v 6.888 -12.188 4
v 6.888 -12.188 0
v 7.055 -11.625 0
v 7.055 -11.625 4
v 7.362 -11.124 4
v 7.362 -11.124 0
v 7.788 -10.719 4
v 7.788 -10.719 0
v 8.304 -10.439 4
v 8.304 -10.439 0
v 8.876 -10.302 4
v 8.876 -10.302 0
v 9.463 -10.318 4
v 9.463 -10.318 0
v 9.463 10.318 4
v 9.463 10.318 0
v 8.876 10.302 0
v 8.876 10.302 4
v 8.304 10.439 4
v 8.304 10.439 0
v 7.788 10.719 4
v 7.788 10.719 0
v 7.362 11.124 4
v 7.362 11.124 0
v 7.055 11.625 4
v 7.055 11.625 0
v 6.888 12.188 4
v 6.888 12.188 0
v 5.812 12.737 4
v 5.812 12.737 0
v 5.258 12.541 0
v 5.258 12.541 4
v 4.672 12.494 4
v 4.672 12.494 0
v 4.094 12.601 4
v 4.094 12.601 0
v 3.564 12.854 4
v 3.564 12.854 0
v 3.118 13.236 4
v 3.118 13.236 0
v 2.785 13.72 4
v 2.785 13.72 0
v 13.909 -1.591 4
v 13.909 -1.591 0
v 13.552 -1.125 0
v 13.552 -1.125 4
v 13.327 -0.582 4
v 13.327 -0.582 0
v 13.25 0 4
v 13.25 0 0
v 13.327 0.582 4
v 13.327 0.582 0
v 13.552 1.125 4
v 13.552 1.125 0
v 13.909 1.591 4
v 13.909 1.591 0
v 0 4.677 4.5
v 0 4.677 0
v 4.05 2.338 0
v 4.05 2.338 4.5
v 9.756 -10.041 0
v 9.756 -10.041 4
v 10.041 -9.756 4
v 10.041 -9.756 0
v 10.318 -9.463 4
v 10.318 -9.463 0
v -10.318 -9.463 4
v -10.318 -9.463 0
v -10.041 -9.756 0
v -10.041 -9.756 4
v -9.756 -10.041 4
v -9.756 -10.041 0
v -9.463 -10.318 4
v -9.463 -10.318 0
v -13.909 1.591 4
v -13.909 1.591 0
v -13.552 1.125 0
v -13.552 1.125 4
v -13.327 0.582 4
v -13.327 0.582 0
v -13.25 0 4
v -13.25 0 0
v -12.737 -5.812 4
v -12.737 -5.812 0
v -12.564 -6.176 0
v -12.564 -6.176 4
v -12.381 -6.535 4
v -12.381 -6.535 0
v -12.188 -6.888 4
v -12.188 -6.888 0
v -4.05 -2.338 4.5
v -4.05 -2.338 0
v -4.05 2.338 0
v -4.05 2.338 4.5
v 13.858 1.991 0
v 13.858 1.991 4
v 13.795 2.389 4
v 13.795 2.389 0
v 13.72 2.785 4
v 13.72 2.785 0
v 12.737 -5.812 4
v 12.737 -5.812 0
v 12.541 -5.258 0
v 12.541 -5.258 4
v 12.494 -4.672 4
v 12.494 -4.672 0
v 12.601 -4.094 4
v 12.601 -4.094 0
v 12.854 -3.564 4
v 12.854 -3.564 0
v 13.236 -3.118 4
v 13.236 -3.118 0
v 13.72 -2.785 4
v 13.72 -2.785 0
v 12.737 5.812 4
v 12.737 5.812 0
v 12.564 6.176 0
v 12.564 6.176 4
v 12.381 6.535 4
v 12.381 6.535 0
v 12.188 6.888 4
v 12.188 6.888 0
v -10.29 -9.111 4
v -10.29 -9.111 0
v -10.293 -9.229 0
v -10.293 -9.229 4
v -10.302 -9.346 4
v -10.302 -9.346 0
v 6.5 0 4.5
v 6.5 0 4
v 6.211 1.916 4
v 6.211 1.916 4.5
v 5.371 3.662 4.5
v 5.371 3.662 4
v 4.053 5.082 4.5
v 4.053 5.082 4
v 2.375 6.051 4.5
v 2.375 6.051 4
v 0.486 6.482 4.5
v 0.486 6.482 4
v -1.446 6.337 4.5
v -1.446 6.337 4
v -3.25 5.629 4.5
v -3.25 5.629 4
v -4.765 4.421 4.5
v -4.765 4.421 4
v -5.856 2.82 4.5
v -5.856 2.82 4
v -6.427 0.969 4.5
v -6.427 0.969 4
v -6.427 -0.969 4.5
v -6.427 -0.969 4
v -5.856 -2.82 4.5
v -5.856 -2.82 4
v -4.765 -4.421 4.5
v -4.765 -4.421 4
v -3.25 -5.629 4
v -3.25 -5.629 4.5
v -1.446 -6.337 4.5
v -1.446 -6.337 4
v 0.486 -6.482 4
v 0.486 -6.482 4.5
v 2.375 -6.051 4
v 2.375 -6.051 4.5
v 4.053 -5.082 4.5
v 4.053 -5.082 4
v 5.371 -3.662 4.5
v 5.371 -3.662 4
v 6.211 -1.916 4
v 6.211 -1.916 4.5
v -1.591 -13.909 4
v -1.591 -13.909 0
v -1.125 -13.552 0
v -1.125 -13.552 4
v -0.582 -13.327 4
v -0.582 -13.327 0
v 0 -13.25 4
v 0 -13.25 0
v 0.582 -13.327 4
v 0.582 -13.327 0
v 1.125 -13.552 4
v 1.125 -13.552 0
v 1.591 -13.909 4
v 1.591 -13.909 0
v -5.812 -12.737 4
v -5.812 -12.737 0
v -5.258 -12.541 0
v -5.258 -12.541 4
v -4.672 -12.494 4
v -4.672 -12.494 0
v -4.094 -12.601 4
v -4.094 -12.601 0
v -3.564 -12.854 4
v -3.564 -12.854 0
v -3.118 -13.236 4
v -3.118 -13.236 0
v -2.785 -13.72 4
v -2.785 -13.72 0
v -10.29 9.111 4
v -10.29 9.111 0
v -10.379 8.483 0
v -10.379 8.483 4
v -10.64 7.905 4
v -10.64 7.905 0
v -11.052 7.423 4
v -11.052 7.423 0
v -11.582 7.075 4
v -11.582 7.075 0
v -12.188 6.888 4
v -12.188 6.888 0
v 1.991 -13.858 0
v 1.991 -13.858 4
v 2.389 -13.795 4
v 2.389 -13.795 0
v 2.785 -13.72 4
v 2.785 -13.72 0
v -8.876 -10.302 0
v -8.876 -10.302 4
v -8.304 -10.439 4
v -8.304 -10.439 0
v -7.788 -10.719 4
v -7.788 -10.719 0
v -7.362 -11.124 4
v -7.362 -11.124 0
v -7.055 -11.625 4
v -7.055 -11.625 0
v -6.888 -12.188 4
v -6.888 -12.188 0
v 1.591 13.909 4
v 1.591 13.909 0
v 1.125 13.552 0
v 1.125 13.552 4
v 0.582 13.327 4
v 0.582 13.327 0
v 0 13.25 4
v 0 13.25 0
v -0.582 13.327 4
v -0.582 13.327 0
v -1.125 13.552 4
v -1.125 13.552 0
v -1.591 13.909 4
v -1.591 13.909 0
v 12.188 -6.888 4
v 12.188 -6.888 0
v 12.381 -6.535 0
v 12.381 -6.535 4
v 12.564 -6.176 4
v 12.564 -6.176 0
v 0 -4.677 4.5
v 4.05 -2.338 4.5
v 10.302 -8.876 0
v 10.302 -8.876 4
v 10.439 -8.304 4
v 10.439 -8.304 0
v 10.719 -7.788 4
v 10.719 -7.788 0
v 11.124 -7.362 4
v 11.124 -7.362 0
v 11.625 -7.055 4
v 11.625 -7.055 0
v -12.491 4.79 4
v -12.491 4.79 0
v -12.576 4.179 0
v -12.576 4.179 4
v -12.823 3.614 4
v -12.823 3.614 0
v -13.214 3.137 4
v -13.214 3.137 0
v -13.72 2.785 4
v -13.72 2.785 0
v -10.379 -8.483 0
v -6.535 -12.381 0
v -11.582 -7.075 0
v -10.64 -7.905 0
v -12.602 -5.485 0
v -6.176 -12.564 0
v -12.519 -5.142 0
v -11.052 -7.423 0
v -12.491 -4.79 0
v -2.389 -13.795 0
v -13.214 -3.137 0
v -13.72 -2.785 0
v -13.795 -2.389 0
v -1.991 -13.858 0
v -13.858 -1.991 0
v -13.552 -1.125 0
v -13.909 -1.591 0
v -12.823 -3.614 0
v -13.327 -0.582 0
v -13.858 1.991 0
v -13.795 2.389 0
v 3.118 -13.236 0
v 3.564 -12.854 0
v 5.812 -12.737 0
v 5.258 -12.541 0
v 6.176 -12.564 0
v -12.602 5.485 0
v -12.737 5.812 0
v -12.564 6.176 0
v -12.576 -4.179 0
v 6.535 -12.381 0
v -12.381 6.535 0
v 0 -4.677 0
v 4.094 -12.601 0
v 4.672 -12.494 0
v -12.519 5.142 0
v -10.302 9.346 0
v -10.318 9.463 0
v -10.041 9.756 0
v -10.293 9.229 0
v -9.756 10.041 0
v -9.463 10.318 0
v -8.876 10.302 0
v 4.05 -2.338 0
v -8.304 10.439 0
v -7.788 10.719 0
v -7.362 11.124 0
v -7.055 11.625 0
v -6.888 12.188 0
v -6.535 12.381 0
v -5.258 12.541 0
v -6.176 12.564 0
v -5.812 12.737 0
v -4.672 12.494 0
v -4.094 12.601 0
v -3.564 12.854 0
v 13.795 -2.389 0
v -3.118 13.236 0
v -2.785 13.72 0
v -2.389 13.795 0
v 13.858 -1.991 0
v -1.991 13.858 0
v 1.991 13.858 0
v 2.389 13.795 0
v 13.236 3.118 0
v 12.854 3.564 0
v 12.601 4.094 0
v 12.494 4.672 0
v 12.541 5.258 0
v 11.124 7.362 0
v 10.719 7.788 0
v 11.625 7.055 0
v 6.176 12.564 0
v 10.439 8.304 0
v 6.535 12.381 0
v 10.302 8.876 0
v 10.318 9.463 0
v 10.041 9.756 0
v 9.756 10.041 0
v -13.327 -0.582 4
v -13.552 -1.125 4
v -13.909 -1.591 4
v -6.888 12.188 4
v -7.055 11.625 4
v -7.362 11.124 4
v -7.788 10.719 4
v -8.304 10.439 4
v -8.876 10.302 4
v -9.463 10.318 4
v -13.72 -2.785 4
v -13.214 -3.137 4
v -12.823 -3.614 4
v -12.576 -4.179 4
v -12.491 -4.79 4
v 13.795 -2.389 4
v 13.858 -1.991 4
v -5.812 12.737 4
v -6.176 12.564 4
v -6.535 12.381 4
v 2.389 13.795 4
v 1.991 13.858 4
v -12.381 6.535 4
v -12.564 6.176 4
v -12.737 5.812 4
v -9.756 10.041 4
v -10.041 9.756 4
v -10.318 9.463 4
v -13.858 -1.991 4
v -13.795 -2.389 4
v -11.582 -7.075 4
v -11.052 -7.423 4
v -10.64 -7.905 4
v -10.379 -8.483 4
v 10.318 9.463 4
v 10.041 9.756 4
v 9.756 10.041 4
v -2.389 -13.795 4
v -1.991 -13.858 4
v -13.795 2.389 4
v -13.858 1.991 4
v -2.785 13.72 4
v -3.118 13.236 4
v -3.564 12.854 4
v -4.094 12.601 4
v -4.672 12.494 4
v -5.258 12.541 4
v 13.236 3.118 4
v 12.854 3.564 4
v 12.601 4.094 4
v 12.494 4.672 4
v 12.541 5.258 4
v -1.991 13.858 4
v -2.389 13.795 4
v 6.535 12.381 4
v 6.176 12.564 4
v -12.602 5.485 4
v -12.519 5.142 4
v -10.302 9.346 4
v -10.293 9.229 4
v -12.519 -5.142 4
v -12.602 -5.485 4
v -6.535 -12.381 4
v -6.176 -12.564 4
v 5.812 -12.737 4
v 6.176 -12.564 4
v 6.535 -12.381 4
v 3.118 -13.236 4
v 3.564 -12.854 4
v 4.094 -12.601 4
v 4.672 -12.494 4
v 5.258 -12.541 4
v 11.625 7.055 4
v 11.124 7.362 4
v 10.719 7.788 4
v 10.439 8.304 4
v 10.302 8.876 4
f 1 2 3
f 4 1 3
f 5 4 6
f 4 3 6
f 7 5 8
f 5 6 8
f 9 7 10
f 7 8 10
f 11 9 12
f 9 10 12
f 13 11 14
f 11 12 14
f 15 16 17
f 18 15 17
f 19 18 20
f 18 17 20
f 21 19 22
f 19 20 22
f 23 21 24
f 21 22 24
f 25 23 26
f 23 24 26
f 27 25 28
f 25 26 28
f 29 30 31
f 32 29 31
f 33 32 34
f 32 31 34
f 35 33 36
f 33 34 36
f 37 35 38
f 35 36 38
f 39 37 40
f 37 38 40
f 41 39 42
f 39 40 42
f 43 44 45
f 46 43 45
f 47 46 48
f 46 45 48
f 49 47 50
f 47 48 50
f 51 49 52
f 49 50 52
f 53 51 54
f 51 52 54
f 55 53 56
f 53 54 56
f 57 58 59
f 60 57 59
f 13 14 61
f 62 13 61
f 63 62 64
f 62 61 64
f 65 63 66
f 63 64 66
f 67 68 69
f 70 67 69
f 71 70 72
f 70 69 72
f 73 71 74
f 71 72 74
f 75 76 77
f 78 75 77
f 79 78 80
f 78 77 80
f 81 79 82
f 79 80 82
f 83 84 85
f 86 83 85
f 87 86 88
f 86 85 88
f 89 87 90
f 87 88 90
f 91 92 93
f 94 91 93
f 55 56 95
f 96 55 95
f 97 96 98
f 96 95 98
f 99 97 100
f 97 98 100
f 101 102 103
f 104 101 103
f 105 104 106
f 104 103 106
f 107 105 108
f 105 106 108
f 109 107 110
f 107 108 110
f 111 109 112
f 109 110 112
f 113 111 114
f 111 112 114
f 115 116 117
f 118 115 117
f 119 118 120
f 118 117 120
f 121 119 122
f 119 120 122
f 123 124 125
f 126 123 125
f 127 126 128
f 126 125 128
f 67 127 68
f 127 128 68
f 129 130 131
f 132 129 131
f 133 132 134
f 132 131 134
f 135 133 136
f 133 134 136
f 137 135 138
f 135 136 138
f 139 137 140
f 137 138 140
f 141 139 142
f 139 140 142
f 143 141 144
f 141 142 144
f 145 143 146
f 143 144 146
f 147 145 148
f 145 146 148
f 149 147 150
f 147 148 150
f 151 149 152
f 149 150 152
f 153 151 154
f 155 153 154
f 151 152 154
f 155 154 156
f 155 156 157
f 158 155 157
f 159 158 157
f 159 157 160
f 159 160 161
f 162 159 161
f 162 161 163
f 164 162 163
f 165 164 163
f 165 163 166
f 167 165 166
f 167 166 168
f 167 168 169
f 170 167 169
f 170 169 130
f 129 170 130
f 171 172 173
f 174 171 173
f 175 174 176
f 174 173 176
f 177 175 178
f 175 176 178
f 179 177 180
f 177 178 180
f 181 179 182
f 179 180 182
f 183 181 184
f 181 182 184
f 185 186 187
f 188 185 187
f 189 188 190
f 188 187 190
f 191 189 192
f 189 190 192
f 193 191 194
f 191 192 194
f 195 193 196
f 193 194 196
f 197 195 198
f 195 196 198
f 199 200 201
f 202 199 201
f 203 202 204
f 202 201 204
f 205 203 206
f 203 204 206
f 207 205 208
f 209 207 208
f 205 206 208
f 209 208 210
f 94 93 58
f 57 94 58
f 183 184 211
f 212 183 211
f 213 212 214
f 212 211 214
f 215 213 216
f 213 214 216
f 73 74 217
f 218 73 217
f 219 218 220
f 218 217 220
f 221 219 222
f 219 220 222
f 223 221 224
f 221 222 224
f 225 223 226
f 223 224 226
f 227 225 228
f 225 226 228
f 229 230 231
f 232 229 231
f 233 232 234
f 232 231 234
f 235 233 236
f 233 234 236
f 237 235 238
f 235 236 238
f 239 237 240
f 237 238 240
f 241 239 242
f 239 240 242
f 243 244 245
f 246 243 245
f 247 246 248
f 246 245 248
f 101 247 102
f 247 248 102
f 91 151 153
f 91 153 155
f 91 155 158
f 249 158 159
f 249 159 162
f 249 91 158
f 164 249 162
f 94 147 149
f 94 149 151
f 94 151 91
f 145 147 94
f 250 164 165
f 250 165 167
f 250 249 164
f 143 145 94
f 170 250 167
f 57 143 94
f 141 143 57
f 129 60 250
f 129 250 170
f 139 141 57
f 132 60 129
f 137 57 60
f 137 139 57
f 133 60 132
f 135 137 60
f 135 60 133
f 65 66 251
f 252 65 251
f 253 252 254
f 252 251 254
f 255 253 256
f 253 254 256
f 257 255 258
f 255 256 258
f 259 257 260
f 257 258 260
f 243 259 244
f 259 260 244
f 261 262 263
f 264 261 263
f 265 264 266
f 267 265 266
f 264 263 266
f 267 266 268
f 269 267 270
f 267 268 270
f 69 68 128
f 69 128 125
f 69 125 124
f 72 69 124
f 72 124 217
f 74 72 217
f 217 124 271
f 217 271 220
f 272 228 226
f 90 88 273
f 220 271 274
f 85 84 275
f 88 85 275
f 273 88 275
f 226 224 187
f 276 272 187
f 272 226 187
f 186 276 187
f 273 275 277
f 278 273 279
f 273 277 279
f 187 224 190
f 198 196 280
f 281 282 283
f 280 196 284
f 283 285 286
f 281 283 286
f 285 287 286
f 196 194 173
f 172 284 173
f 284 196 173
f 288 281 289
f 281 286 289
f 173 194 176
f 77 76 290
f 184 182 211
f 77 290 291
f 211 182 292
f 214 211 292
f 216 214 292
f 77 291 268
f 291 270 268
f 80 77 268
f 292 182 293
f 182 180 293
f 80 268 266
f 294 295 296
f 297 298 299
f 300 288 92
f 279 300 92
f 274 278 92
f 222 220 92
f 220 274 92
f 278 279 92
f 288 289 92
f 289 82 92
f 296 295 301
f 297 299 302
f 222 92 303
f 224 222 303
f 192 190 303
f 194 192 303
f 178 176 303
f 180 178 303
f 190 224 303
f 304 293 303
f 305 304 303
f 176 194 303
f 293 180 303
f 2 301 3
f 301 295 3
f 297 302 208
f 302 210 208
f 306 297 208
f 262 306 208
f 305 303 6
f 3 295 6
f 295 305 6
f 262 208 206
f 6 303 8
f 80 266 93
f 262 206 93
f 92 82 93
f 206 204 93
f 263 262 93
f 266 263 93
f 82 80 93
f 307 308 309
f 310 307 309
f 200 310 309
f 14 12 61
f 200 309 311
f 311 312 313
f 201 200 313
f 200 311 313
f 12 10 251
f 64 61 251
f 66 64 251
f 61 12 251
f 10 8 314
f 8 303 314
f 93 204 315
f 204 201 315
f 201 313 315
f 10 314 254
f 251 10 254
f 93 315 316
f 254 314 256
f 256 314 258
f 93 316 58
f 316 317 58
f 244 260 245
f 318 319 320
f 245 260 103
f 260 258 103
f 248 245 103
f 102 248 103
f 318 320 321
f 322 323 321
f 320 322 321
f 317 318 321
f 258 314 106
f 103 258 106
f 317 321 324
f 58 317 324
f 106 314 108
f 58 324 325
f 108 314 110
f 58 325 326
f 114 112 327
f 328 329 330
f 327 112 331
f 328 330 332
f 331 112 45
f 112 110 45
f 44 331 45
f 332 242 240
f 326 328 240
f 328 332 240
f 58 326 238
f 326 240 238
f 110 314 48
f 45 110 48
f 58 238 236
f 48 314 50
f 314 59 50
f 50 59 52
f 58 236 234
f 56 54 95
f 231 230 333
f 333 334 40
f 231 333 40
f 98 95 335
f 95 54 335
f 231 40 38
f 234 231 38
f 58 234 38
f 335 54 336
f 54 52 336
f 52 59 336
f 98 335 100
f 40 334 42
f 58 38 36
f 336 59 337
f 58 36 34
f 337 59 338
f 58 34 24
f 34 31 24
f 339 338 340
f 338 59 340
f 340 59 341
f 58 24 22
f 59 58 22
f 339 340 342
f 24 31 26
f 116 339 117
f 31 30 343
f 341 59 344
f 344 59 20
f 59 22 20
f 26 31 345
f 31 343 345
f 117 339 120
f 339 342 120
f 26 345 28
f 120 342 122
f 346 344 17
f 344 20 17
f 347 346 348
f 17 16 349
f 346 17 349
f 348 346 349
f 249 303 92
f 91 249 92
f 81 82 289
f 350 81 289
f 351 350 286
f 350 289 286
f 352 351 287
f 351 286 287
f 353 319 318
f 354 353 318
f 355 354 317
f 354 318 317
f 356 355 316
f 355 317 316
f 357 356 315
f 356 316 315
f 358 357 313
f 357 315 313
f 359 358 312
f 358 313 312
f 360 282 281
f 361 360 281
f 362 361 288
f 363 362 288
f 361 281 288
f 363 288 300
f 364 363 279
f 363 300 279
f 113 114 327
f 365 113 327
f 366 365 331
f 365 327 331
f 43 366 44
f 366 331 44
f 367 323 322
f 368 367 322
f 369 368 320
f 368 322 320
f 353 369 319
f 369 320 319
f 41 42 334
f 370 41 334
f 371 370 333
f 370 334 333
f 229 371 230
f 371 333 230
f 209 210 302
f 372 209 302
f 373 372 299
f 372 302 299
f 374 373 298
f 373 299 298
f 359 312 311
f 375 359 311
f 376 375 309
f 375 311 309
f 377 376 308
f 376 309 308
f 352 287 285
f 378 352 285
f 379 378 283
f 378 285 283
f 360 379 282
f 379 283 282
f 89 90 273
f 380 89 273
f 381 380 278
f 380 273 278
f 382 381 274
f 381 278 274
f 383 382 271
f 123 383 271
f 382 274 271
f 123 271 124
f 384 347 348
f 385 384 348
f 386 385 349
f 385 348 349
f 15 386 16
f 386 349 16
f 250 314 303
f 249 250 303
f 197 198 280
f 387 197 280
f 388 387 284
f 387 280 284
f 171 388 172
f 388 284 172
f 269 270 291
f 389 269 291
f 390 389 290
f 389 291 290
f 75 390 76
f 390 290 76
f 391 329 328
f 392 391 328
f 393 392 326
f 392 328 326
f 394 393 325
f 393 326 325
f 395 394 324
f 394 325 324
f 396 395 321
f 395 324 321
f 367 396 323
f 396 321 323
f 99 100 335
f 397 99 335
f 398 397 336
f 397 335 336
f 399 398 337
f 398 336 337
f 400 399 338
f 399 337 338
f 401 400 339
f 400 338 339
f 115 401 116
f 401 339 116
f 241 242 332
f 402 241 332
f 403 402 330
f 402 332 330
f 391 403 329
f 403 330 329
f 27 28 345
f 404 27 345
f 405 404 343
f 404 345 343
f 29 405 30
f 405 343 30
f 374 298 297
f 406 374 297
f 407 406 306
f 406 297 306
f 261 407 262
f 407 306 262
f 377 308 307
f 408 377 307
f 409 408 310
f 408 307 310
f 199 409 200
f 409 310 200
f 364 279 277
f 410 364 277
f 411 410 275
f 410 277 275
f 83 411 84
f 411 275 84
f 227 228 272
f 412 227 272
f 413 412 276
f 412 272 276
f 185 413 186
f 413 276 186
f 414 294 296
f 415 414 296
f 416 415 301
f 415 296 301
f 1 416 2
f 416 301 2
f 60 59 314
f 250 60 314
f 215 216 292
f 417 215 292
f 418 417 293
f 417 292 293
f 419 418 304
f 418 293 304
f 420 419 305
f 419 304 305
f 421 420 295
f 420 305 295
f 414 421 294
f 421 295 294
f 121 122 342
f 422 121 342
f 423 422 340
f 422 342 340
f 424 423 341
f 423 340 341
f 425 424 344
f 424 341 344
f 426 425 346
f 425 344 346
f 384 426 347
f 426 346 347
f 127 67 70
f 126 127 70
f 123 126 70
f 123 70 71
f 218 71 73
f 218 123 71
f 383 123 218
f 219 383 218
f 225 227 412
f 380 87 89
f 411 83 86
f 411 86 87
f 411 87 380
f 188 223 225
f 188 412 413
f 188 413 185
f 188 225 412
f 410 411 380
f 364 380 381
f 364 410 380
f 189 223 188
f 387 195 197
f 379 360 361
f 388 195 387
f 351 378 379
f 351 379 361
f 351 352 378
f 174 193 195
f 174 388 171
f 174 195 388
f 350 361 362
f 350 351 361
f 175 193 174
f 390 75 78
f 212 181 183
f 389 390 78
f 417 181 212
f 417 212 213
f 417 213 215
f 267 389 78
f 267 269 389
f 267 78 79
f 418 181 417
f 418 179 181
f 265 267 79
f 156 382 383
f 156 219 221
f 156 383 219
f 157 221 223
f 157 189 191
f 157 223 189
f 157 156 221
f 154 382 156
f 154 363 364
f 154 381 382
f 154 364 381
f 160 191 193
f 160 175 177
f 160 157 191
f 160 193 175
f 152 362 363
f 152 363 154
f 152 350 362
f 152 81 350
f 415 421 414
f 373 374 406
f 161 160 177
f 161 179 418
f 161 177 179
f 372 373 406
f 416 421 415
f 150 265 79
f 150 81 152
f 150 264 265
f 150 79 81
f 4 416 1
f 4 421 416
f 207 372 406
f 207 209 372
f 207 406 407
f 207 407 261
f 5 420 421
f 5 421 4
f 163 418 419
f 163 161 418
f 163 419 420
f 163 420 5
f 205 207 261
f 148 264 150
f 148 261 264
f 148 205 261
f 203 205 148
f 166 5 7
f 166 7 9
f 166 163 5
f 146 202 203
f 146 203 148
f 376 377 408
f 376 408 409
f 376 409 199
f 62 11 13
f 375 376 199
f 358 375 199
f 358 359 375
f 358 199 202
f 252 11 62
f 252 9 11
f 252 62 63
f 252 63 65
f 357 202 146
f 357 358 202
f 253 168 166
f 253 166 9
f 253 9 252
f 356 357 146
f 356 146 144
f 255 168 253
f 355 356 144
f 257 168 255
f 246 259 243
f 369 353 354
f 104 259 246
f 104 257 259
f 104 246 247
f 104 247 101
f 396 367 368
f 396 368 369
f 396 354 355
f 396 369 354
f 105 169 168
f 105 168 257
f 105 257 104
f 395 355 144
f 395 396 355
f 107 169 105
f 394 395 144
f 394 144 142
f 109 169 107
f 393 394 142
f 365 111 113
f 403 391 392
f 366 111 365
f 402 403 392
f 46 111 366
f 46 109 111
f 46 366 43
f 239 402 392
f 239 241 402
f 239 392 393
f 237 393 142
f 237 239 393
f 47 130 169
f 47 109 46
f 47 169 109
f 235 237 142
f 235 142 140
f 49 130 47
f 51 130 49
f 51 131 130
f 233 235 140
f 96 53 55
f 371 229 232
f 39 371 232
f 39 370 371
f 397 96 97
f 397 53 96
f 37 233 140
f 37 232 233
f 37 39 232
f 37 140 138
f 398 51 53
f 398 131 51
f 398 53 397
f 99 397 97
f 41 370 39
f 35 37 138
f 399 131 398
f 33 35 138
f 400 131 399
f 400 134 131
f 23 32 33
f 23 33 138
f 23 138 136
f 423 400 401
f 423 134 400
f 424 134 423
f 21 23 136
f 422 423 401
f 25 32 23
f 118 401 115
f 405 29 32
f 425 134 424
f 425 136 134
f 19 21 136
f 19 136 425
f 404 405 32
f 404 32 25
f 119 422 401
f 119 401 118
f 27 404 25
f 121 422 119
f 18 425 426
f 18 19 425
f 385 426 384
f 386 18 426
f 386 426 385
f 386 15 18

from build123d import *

# Parameters (mm, degrees)
F0_R     = 6.5
F1_DEPTH = 4
F2_DEPTH = 4.5


with BuildPart() as f1:
    # F0 (on Top) → F1 (new body)
    with BuildSketch(Plane.XY):
        with BuildLine():
            ThreePointArc((13.909274, -1.591255), (13.25, 0), (13.909274, 1.591255))
            ThreePointArc((13.909274, 1.591255), (13.827637, 2.190083), (13.720231, 2.784829))
            ThreePointArc((13.720231, 2.784829), (12.601499, 4.094475), (12.736781, 5.811575))
            ThreePointArc((12.736781, 5.811575), (12.474091, 6.355867), (12.188155, 6.888314))
            ThreePointArc((12.188155, 6.888314), (10.719475, 7.788155), (10.317523, 9.463018))
            ThreePointArc((10.317523, 9.463018), (9.899495, 9.899495), (9.463018, 10.317523))
            ThreePointArc((9.463018, 10.317523), (7.788155, 10.719475), (6.888314, 12.188155))
            ThreePointArc((6.888314, 12.188155), (6.355867, 12.474091), (5.811575, 12.736781))
            ThreePointArc((5.811575, 12.736781), (4.094475, 12.601499), (2.784829, 13.720231))
            ThreePointArc((2.784829, 13.720231), (2.190083, 13.827637), (1.591255, 13.909274))
            ThreePointArc((1.591255, 13.909274), (0, 13.25), (-1.591255, 13.909274))
            ThreePointArc((-1.591255, 13.909274), (-2.190083, 13.827637), (-2.784829, 13.720231))
            ThreePointArc((-2.784829, 13.720231), (-4.094475, 12.601499), (-5.811575, 12.736781))
            ThreePointArc((-5.811575, 12.736781), (-6.355867, 12.474091), (-6.888314, 12.188155))
            ThreePointArc((-6.888314, 12.188155), (-7.788155, 10.719475), (-9.463018, 10.317523))
            ThreePointArc((-9.463018, 10.317523), (-9.899495, 9.899495), (-10.317523, 9.463018))
            ThreePointArc((-10.317523, 9.463018), (-10.296714, 9.287391), (-10.289763, 9.110671))
            ThreePointArc((-10.289763, 9.110671), (-10.828971, 7.649271), (-12.188155, 6.888314))
            ThreePointArc((-12.188155, 6.888314), (-12.474091, 6.355867), (-12.736781, 5.811575))
            ThreePointArc((-12.736781, 5.811575), (-12.553587, 5.315197), (-12.491376, 4.789763))
            ThreePointArc((-12.491376, 4.789763), (-12.823033, 3.613982), (-13.720231, 2.784829))
            ThreePointArc((-13.720231, 2.784829), (-13.827637, 2.190083), (-13.909274, 1.591255))
            ThreePointArc((-13.909274, 1.591255), (-13.421343, 0.86121), (-13.25, 0))
            ThreePointArc((-13.25, 0), (-13.421343, -0.86121), (-13.909274, -1.591255))
            ThreePointArc((-13.909274, -1.591255), (-13.827637, -2.190083), (-13.720231, -2.784829))
            ThreePointArc((-13.720231, -2.784829), (-12.823033, -3.613982), (-12.491376, -4.789763))
            ThreePointArc((-12.491376, -4.789763), (-12.553587, -5.315197), (-12.736781, -5.811575))
            ThreePointArc((-12.736781, -5.811575), (-12.474091, -6.355867), (-12.188155, -6.888314))
            ThreePointArc((-12.188155, -6.888314), (-10.828971, -7.649271), (-10.289763, -9.110671))
            ThreePointArc((-10.289763, -9.110671), (-10.296714, -9.287391), (-10.317523, -9.463018))
            ThreePointArc((-10.317523, -9.463018), (-9.899495, -9.899495), (-9.463018, -10.317523))
            ThreePointArc((-9.463018, -10.317523), (-7.788155, -10.719475), (-6.888314, -12.188155))
            ThreePointArc((-6.888314, -12.188155), (-6.355867, -12.474091), (-5.811575, -12.736781))
            ThreePointArc((-5.811575, -12.736781), (-4.094475, -12.601499), (-2.784829, -13.720231))
            ThreePointArc((-2.784829, -13.720231), (-2.190083, -13.827637), (-1.591255, -13.909274))
            ThreePointArc((-1.591255, -13.909274), (0, -13.25), (1.591255, -13.909274))
            ThreePointArc((1.591255, -13.909274), (2.190083, -13.827637), (2.784829, -13.720231))
            ThreePointArc((2.784829, -13.720231), (4.094475, -12.601499), (5.811575, -12.736781))
            ThreePointArc((5.811575, -12.736781), (6.355867, -12.474091), (6.888314, -12.188155))
            ThreePointArc((6.888314, -12.188155), (7.788155, -10.719475), (9.463018, -10.317523))
            ThreePointArc((9.463018, -10.317523), (9.899495, -9.899495), (10.317523, -9.463018))
            ThreePointArc((10.317523, -9.463018), (10.719475, -7.788155), (12.188155, -6.888314))
            ThreePointArc((12.188155, -6.888314), (12.474091, -6.355867), (12.736781, -5.811575))
            ThreePointArc((12.736781, -5.811575), (12.601499, -4.094475), (13.720231, -2.784829))
            ThreePointArc((13.720231, -2.784829), (13.827637, -2.190083), (13.909274, -1.591255))
        make_face()
        Circle(F0_R, mode=Mode.SUBTRACT)
    extrude(amount=F1_DEPTH)

    # F0 (on Top) → F2 (join)
    with BuildSketch(Plane.XY):
        Circle(F0_R)
        Polygon((4.05, 2.338269), (4.05, -2.338269), (0, -4.676537), (-4.05, -2.338269), (-4.05, 2.338269), (0, 4.676537), align=None, mode=Mode.SUBTRACT)
    extrude(amount=F2_DEPTH)


solid = f1.part
